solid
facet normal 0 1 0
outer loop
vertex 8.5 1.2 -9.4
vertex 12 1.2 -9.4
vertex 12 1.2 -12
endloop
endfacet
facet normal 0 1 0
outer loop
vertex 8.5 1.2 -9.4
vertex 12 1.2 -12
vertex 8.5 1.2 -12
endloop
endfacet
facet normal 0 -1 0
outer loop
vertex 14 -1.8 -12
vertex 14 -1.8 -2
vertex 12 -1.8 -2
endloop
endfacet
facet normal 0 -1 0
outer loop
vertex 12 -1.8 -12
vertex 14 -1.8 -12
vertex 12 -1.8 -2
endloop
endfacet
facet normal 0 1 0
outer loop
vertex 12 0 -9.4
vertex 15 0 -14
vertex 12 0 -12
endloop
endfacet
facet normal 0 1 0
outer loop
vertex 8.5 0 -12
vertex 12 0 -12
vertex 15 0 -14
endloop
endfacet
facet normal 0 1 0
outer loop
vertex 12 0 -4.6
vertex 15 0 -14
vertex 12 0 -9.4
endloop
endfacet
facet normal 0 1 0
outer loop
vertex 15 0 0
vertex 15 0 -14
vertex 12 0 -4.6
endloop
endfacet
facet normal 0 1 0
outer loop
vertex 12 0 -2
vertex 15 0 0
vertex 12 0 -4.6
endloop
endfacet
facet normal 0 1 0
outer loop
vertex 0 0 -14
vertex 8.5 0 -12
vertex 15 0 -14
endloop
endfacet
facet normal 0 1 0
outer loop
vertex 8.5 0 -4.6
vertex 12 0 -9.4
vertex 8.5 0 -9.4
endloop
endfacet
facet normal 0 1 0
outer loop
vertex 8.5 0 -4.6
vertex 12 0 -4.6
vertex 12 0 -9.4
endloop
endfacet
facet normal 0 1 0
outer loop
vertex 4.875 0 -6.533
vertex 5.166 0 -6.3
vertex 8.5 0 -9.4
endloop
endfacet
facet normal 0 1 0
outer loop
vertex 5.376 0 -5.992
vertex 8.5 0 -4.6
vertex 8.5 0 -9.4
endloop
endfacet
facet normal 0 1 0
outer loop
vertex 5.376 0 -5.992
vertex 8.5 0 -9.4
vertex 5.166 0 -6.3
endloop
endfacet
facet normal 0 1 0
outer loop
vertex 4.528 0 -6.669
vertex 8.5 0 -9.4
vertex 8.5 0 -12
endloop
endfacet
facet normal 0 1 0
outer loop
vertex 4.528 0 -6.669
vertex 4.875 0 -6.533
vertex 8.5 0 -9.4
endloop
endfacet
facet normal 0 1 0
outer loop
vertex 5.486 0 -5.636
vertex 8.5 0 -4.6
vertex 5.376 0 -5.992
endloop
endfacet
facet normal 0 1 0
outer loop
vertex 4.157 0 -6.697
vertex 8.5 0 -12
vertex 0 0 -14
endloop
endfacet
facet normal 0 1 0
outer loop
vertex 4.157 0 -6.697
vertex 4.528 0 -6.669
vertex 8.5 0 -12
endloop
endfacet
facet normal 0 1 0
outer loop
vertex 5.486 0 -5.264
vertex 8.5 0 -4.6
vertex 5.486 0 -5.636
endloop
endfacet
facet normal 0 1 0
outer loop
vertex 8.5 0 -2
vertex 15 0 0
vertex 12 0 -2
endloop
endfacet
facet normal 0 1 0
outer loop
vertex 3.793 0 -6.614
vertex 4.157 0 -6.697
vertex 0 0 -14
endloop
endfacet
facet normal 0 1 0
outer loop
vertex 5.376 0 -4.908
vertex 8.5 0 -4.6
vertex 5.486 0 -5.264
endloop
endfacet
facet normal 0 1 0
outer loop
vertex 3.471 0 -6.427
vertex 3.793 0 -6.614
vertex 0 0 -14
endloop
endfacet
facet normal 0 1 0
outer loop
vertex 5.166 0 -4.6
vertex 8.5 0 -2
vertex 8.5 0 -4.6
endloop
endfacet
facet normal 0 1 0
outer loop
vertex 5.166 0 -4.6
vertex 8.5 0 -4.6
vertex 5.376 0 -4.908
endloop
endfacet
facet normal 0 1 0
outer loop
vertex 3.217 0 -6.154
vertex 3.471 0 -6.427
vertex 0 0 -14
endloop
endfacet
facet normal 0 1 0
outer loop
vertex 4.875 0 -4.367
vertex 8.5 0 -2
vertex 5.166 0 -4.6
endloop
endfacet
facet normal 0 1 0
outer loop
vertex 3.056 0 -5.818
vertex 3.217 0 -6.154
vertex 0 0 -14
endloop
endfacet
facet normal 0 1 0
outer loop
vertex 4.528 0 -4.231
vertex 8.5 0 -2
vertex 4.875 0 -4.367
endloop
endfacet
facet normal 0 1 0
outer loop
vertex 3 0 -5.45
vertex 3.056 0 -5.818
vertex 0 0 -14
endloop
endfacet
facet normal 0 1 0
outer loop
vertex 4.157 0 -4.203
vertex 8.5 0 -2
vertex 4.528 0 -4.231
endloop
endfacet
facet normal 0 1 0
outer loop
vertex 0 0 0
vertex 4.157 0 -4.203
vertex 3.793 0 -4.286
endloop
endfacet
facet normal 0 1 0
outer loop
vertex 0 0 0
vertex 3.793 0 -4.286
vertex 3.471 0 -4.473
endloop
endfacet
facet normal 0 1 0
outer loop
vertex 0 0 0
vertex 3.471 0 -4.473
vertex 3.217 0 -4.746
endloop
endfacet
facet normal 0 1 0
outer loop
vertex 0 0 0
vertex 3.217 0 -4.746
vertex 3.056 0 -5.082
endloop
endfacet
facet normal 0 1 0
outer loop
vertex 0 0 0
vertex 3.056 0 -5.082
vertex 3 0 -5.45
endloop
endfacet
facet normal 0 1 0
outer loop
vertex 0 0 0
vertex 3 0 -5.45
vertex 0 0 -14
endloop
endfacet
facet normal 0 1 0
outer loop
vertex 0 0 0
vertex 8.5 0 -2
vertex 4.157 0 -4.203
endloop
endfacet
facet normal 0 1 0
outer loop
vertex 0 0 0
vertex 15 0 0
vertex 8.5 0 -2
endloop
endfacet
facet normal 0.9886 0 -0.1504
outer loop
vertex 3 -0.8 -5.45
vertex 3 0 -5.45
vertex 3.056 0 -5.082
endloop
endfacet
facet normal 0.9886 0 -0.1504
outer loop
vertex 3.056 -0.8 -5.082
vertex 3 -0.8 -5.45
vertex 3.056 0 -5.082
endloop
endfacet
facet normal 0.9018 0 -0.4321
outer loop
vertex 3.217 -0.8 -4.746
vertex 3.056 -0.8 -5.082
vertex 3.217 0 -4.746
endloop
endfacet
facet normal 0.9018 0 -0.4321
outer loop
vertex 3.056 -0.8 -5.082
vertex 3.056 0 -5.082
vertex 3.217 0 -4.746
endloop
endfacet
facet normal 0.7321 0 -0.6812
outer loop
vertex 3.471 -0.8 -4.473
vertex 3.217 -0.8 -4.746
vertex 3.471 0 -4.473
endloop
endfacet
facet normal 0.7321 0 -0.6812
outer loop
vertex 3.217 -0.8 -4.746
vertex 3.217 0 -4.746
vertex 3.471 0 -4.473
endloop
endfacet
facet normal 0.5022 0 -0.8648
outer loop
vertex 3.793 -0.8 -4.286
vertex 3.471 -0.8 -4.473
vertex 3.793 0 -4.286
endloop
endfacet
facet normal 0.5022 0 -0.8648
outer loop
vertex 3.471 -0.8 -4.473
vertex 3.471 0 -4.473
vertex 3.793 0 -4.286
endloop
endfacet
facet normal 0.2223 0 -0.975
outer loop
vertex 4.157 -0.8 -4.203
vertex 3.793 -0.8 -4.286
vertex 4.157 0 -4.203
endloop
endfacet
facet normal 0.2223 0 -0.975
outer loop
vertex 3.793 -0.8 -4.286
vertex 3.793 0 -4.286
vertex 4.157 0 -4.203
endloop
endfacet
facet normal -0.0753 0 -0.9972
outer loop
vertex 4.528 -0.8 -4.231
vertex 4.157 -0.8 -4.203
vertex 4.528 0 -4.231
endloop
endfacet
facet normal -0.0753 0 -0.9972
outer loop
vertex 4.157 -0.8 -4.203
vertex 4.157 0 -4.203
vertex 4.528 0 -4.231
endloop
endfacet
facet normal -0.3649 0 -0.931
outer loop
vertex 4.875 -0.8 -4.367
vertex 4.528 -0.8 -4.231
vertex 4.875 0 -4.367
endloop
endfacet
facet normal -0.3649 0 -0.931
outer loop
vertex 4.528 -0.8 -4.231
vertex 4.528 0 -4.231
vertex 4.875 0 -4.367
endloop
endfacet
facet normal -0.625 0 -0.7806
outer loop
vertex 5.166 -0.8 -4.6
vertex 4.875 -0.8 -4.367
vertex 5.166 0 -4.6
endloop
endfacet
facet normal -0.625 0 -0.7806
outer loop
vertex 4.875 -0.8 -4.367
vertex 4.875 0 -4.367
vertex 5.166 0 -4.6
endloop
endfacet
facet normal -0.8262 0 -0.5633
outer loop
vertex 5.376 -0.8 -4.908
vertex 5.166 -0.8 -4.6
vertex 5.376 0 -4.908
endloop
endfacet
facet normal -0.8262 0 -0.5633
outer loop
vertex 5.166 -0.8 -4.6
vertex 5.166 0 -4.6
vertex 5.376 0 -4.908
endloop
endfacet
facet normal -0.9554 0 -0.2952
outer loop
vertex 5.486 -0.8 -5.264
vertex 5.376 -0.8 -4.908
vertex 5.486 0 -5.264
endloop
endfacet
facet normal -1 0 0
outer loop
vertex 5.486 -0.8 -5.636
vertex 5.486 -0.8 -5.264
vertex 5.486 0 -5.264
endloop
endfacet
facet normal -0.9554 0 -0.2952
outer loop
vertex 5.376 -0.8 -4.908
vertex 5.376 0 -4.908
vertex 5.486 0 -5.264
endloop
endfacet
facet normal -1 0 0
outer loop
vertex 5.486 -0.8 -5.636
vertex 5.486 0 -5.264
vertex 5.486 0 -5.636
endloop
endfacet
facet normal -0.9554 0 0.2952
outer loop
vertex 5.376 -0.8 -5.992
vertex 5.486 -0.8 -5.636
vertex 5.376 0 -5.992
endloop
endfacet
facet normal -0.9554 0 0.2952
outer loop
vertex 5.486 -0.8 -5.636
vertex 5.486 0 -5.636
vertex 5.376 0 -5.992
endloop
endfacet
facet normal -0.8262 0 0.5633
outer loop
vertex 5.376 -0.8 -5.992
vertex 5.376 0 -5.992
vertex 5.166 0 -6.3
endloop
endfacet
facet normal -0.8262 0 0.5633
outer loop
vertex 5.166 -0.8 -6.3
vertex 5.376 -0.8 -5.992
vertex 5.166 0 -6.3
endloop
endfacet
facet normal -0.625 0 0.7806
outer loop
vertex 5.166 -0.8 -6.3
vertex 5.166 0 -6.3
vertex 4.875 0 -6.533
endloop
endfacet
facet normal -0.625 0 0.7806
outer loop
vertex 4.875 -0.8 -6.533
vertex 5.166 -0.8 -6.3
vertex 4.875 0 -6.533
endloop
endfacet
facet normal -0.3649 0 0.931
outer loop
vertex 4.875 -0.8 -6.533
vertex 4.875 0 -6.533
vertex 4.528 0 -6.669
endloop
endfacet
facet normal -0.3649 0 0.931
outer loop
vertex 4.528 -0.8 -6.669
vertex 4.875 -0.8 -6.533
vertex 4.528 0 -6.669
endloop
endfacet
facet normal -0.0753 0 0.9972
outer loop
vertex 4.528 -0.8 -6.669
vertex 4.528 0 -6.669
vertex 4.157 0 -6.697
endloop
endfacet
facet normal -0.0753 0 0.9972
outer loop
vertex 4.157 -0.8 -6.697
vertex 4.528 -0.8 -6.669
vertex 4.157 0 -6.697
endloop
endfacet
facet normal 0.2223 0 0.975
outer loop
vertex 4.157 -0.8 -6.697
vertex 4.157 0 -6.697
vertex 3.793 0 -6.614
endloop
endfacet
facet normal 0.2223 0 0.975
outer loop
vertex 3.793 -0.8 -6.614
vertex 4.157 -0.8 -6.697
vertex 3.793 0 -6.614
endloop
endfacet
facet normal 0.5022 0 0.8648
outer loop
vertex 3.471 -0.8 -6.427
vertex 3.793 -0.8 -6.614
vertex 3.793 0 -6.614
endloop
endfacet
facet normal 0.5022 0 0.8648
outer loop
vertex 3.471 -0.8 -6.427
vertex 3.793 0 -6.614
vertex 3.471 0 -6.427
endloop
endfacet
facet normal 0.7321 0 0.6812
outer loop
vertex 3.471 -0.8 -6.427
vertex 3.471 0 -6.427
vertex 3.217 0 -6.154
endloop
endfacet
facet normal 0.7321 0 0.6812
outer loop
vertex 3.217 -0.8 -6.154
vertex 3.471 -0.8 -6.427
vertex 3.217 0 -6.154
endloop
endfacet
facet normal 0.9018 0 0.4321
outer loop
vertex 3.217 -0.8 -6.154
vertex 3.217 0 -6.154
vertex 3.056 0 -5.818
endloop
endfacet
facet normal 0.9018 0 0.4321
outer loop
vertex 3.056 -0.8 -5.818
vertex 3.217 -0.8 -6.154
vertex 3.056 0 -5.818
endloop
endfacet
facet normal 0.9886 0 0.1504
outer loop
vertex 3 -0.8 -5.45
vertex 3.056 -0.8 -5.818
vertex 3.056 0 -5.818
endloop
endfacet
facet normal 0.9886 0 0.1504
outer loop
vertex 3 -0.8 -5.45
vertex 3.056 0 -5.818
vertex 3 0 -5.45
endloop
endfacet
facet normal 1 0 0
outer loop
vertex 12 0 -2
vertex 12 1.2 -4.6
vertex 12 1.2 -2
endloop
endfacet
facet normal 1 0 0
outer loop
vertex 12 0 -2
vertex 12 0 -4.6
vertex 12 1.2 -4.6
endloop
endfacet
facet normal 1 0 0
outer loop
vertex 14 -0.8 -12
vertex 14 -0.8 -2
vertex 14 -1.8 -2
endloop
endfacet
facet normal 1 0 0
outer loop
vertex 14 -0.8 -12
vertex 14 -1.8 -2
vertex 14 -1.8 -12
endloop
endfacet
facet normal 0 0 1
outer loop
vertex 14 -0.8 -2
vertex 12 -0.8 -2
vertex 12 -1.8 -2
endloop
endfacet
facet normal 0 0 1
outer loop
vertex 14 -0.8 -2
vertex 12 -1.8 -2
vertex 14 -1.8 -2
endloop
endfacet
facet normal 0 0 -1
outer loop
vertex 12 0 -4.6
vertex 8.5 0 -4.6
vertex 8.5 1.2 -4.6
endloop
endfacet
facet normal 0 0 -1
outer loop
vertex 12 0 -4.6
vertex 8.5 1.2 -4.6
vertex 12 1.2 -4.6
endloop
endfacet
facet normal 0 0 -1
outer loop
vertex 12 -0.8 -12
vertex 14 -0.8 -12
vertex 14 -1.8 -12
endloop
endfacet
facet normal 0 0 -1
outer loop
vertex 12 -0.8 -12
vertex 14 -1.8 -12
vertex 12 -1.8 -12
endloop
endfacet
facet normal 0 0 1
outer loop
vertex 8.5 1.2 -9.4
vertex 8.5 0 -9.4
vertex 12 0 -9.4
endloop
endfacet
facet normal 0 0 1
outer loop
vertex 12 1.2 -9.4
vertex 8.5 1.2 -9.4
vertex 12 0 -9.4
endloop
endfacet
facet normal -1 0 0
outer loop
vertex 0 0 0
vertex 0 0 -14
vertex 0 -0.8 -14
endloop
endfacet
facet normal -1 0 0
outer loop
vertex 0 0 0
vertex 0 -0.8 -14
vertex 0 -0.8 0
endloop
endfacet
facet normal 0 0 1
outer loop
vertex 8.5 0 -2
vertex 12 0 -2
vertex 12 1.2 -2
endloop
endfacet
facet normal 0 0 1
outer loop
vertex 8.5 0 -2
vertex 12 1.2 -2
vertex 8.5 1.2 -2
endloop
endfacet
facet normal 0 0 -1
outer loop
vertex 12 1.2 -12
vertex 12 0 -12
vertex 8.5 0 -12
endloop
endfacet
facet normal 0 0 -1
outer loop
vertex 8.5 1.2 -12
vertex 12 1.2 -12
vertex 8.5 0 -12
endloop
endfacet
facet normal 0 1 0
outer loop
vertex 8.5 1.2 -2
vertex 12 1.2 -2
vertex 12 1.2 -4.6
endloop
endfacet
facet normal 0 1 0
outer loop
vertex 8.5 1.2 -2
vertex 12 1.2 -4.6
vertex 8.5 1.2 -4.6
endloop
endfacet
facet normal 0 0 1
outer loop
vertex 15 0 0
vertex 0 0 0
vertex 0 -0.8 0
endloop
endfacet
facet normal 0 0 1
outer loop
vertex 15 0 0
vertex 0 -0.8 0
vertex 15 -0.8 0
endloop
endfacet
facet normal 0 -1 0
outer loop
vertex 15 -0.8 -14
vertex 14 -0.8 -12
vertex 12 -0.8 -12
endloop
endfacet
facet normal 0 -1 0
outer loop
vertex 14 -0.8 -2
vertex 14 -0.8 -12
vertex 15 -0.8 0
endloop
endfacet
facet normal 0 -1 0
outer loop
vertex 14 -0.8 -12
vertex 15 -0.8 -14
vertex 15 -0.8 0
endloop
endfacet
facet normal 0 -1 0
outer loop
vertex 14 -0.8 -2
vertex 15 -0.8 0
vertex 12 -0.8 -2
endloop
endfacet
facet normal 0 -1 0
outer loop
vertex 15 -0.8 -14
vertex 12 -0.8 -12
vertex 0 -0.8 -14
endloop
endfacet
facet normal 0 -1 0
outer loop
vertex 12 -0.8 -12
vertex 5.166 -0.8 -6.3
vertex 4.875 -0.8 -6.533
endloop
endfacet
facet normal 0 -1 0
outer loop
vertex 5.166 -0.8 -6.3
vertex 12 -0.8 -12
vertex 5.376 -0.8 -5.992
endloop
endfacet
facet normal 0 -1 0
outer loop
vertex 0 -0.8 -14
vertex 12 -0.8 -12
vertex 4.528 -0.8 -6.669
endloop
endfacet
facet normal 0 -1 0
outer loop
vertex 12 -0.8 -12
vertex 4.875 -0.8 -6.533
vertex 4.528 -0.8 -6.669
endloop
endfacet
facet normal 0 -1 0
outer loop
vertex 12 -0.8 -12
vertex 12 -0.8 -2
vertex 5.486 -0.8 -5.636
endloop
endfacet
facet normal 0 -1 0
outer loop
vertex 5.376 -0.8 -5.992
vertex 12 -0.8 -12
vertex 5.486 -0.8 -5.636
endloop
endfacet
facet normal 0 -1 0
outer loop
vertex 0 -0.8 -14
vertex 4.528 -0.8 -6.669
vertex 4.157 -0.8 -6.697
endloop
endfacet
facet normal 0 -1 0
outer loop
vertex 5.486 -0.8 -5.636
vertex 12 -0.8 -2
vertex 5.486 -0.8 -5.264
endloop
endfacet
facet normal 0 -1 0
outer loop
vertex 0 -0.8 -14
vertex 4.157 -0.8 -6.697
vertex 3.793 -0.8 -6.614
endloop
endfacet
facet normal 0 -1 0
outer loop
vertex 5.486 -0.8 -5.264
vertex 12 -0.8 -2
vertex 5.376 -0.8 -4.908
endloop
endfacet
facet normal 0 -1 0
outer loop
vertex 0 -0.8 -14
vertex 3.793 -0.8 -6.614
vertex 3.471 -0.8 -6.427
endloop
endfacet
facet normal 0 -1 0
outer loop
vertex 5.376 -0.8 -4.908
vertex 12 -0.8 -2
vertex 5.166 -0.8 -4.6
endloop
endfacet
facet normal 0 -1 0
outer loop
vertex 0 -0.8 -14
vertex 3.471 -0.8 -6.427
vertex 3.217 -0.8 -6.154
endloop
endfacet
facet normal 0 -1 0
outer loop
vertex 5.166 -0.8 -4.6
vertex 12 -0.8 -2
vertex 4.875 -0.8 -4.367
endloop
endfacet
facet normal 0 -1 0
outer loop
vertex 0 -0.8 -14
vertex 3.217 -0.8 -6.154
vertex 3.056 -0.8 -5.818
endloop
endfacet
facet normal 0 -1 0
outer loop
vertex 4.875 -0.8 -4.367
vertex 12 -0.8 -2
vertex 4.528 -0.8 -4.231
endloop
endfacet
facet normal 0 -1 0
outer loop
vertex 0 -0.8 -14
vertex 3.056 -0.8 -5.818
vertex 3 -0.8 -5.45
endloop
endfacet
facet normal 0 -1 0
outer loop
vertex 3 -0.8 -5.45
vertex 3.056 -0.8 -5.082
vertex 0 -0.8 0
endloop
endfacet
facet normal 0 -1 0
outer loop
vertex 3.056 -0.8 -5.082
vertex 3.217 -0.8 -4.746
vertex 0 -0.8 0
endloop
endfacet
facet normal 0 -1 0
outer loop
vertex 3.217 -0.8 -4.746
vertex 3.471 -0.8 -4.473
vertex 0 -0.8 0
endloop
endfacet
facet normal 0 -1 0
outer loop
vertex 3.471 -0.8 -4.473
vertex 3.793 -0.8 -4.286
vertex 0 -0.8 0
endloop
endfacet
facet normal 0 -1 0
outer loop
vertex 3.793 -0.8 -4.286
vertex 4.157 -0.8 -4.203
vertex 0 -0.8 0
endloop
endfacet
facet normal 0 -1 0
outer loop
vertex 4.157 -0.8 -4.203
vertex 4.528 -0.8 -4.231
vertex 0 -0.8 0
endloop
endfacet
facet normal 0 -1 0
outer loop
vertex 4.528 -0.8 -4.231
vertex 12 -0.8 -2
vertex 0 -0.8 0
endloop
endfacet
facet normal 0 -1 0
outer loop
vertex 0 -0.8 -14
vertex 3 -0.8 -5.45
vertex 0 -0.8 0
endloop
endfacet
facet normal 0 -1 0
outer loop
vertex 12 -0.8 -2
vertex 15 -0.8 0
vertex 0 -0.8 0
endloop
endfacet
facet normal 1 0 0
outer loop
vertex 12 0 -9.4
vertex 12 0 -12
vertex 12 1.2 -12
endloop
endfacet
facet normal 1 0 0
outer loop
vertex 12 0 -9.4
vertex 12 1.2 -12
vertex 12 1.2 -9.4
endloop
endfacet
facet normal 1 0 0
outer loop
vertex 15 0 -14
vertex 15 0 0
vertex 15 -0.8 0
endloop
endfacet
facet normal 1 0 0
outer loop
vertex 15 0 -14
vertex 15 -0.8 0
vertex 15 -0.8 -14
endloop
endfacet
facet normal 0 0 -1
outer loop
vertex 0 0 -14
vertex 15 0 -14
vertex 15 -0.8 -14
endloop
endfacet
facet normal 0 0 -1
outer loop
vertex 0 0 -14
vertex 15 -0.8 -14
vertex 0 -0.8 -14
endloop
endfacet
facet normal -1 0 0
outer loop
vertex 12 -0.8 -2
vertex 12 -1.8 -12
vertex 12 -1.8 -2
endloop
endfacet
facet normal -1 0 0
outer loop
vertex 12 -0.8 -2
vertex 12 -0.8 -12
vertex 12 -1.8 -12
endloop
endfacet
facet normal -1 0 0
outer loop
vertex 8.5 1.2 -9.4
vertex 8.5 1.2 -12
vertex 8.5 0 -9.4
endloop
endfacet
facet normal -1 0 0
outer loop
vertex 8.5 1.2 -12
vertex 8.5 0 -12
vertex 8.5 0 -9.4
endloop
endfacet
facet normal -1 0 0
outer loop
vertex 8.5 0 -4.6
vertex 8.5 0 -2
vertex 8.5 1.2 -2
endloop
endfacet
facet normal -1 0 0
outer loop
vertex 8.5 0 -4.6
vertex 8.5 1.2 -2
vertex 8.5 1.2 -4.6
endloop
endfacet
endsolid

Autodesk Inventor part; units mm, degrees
ref_plane "YZ Plane" through (0, 0, 0) normal (1, 0, 0) x (0, 1, 0)
ref_plane "XZ Plane" through (0, 0, 0) normal (0, 1, 0) x (-1, 0, 0)
ref_plane "XY Plane" through (0, 0, 0) normal (0, 0, 1) x (1, 0, 0)
sketch "Sketch1" plane through (0, 0, 0) normal (0, 1, 0) x (-1, 0, 0)
  line L0 (0, 0) -> (-15, 0)
  line L1 (-15, 0) -> (-15, -14)
  line L2 (-15, -14) -> (0, -14)
  line L3 (0, -14) -> (0, 0)
  line L4 (0, -4.2) -> (-15, -4.2)
  line L5 (-3, 0) -> (-3, -14)
  circle A0 centre (-4.25, -5.45) radius 1.25
  line L6 (-12, -2) -> (-14, -2)
  line L7 (-14, -2) -> (-14, -12)
  line L8 (-14, -12) -> (-12, -12)
  line L9 (-12, -12) -> (-12, -2)
  line L10 (-12, -2) -> (-8.5, -2)
  line L11 (-8.5, -2) -> (-8.5, -4.6)
  line L12 (-8.5, -4.6) -> (-12, -4.6)
  line L13 (-12, -4.6) -> (-12, -2)
  line L14 (-12, -12) -> (-8.5, -12)
  line L15 (-8.5, -12) -> (-8.5, -9.4)
  line L16 (-8.5, -9.4) -> (-12, -9.4)
  line L17 (-12, -9.4) -> (-12, -12)
  dimension "d0" = 15
  dimension "d1" = 14
  dimension "d2" = 4.2
  dimension "d3" = 3
  dimension "d4" = 2.5
  dimension "d5" = 10
  dimension "d6" = 2
  dimension "d7" = 2
  dimension "d8" = 2
  dimension "d9" = 1
  dimension "d10" = 3.5
  dimension "d11" = 3.5
  dimension "d12" = 2.6
  dimension "d13" = 2.6
  dimension "d14" = 2
  dimension "d15" = 2
extrude "Extrusion1" add sketch "Sketch1" against normal blind 0.8 contours L3 L4 L5 L0 | L5 L4 L11 L10 L6 L7 L1 L0 | L3 L2 L5 L4 | L5 A0 L4 | L4 L7 L8 L14 L15 L16 L9 L12 L11 A0 L5 L2 L1 | L7 L6 L9 L4 | L4 L9 L8 L7 | L11 L12 L9 L4 | L4 L9 L10 L11 | L9 L16 L15 L14
extrude "Extrusion2" add sketch "Sketch1" along normal blind 1.2 contours L11 L12 L9 L4 | L4 L9 L10 L11 | L9 L16 L15 L14
extrude "Extrusion3" add sketch "Sketch1" against normal blind 1.8 contours L7 L6 L9 L4 | L4 L9 L8 L7
equation "\"d7\" = d8"
properties part number "line_sensor" material "Thermoplastic Resin"
